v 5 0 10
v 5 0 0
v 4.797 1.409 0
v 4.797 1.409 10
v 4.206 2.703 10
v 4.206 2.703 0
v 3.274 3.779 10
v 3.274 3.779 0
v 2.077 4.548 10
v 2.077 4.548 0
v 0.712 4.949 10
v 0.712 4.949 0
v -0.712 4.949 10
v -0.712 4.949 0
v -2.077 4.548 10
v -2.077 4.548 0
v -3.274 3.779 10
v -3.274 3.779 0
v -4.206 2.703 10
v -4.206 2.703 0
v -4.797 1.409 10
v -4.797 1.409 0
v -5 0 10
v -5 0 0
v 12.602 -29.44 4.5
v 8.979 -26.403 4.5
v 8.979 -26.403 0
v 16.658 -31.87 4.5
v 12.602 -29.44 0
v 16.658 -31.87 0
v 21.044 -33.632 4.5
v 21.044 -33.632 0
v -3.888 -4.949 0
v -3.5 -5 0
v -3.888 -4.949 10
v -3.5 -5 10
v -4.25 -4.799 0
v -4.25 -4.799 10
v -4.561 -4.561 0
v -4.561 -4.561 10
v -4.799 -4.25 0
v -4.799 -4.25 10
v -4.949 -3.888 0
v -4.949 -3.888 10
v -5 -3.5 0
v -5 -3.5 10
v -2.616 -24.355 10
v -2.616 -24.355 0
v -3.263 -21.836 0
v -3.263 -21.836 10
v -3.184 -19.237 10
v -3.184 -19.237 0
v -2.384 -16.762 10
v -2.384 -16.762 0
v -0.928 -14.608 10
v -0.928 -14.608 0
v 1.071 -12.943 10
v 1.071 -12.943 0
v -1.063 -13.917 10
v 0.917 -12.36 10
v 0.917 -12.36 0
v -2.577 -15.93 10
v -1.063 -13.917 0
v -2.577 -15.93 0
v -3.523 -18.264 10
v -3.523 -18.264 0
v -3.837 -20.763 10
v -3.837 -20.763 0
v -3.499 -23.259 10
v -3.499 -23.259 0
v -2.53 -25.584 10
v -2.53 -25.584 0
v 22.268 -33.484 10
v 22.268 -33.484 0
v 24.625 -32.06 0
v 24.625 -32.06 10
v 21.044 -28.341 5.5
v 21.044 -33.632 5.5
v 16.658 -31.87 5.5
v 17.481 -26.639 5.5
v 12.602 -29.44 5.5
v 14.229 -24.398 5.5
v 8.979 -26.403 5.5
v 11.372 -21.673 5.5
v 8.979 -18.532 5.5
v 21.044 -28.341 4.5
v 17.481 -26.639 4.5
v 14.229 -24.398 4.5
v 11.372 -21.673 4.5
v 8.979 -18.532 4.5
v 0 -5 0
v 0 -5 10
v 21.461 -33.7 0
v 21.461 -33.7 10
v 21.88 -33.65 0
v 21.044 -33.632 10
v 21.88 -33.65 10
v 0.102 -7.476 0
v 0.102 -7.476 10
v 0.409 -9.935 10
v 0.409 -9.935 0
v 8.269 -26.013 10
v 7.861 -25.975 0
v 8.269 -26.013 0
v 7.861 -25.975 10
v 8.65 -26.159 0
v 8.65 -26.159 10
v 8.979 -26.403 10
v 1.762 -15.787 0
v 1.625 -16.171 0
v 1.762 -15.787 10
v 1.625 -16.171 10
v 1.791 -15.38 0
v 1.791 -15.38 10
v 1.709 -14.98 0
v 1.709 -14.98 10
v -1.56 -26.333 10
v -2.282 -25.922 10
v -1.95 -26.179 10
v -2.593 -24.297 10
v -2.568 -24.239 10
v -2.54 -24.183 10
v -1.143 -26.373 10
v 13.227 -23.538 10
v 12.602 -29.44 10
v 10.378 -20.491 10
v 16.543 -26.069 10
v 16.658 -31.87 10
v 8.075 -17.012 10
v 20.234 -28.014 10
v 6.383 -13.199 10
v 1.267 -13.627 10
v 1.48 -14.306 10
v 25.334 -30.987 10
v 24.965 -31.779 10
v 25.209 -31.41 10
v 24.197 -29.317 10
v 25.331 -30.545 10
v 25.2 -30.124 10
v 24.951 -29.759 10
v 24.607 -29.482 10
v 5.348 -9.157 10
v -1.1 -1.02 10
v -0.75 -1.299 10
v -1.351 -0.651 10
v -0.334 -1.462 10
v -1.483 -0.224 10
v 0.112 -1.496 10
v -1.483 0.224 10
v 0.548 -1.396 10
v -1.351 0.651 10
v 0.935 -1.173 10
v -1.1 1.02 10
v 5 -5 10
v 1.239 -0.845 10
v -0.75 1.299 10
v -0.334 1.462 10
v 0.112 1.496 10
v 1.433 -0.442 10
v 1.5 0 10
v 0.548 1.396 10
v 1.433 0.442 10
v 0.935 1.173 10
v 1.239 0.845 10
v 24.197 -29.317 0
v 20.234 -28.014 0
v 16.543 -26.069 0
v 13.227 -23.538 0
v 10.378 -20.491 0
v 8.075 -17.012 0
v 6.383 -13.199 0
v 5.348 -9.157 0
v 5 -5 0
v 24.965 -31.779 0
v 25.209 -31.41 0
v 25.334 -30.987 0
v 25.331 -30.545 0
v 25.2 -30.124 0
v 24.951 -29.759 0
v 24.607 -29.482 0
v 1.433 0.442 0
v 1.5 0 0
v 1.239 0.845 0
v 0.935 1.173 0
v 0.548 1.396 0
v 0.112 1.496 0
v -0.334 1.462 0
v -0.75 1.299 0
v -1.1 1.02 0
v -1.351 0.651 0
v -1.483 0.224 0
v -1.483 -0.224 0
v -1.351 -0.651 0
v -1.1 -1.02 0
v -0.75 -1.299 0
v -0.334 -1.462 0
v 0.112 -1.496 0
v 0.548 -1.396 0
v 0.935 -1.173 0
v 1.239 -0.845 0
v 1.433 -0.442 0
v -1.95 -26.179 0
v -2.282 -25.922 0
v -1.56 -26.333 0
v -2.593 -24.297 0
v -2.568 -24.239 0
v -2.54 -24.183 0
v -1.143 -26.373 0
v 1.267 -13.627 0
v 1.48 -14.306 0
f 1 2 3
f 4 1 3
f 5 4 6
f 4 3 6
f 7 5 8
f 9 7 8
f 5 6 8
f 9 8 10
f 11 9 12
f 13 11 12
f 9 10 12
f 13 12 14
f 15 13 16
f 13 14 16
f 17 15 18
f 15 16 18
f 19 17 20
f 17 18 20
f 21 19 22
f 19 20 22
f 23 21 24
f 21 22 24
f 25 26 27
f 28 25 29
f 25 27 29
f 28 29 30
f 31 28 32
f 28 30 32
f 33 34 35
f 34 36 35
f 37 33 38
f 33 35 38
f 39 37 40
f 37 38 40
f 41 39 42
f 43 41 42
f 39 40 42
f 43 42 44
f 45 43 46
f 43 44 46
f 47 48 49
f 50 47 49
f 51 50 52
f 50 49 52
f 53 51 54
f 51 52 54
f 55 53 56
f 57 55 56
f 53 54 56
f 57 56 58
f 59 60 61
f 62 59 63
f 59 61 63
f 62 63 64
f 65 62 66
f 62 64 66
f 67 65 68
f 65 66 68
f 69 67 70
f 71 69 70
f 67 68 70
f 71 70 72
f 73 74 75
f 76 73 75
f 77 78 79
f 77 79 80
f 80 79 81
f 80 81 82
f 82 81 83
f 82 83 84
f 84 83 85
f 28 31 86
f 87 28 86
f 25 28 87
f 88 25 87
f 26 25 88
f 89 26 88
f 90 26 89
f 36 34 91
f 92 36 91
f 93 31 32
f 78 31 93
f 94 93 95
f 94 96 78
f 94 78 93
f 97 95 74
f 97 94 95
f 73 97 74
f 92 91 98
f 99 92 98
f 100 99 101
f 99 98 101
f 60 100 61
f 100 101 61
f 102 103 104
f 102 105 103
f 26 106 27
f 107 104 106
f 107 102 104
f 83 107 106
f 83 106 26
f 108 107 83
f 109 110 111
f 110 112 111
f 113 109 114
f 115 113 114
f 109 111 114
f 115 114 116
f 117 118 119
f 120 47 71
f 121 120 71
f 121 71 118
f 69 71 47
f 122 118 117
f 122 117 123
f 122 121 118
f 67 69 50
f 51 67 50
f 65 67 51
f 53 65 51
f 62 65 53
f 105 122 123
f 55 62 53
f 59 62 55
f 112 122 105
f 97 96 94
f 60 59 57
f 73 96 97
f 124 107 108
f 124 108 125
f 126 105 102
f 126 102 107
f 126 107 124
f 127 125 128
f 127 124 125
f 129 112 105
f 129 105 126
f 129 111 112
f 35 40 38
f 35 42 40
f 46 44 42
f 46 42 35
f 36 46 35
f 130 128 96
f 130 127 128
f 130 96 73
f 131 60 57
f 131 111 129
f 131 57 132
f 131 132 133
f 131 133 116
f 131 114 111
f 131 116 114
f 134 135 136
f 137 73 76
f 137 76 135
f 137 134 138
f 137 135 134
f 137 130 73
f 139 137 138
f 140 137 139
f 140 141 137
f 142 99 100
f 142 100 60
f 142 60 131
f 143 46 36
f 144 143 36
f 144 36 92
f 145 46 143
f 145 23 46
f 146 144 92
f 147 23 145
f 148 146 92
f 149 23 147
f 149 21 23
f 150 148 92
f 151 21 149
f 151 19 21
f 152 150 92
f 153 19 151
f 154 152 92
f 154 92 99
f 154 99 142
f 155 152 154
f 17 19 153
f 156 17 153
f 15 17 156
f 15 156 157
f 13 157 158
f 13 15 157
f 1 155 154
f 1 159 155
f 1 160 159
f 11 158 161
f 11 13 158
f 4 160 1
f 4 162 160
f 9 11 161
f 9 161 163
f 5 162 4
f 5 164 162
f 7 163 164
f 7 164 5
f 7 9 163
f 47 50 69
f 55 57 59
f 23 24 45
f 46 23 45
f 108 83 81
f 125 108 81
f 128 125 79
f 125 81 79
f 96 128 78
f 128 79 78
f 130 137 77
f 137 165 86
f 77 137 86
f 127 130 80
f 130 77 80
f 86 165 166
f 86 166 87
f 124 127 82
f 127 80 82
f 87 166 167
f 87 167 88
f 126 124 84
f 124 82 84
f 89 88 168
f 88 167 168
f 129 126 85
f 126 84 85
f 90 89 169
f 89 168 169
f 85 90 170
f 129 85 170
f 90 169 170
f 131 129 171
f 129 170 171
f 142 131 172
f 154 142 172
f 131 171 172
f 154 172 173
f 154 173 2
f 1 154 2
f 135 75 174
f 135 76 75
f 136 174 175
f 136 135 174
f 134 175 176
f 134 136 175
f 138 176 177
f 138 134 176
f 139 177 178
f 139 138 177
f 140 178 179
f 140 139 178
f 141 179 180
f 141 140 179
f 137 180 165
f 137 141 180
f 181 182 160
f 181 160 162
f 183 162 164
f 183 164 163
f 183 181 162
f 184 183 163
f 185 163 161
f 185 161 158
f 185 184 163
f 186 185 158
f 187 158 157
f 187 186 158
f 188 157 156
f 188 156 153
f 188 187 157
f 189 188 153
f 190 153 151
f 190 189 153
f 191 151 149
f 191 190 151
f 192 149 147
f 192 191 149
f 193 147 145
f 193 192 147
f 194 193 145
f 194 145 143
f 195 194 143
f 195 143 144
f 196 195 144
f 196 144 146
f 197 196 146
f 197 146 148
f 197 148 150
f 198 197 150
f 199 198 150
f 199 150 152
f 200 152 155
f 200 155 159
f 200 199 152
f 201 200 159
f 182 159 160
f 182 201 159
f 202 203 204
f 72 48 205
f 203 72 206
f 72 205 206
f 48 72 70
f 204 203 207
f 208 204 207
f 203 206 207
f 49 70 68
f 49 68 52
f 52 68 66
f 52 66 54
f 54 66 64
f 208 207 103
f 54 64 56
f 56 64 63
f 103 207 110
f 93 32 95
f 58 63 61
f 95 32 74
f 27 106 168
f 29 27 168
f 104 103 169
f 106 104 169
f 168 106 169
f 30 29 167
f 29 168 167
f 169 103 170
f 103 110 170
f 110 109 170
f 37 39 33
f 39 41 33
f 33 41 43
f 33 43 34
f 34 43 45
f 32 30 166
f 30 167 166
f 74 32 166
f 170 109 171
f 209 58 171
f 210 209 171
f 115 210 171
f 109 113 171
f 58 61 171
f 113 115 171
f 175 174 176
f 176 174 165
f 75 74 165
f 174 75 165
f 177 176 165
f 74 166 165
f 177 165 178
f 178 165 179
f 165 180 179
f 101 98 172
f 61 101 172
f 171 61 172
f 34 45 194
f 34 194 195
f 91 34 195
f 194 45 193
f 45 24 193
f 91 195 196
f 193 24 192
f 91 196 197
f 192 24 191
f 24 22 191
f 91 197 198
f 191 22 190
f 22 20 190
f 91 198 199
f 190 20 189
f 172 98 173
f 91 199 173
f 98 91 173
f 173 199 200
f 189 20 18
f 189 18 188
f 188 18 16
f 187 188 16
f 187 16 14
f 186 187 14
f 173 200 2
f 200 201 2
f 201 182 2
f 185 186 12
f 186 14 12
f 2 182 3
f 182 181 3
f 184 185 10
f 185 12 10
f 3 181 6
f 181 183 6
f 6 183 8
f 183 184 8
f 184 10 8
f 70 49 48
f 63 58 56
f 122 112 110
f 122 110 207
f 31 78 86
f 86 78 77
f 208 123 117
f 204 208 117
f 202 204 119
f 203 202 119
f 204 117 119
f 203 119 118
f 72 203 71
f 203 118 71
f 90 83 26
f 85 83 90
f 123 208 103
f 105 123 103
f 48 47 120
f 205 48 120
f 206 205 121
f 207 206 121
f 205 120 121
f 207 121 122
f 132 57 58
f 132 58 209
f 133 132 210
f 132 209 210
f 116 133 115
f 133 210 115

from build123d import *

# Parameters (mm, degrees)
SKETCH_2_R              = 1.5
EXTRUDE_1_DEPTH         = 10
FILLET_1_R              = 1.5
CUT_EXTRUDE_START       = 8.978636738
CUT_EXTRUDE_6_OUTLINE_W = 18
CUT_EXTRUDE_6_OUTLINE_H = 1
CUT_EXTRUDE_6_DEPTH     = 12.065744551
EXTRUDE_START           = -10
EXTRUDE_2_DEPTH         = 10


# Read off the part's stored shape, not the designer's step: 切除-拉伸6
with BuildPart() as part:
    # 草图2 → 凸台-拉伸1 (new body)
    with BuildSketch(Plane.XY):
        with BuildLine():
            Line((-3.738313135, -26.487804482), (8.522639585, -25.945713856))
            ThreePointArc((8.522639585, -25.945713856), (14.597644225, -30.744268797), (21.698305683, -33.828489568))
            Line((21.698305683, -33.828489568), (28.148131868, -29.931317342))
            ThreePointArc((28.148131868, -29.931317342), (11.679291726, -22.010339454), (5, -5))
            Line((5, -5), (5, 0))
            ThreePointArc((5, 0), (0, 5), (-5, 0))
            Line((-5, 0), (-5, -5))
            Line((-5, -5), (1.011e-06, -5))
            ThreePointArc((1.011e-06, -5), (0.486326168, -10.379869542), (1.929534162, -15.585314685))
            Line((1.929534162, -15.585314685), (-3.738313135, -26.487804482))
        make_face()
        Circle(SKETCH_2_R, mode=Mode.SUBTRACT)
    extrude(amount=EXTRUDE_1_DEPTH)

    # 圆角1
    fillet_1_edges = [part.edges().sort_by_distance(p)[0] for p in [
        (-3.738313135, -26.487804482, 5),
        (1.929534162, -15.585314685, 5),
        (-5, -5, 5),
        (28.148131868, -29.931317342, 5),
        (21.698305683, -33.828489568, 5),
        (8.522639585, -25.945713856, 5),
    ]]
    fillet(fillet_1_edges, radius=FILLET_1_R)

    # 切除-拉伸6 outline → 切除-拉伸6 (cut)
    with BuildSketch(Plane.YZ.offset(CUT_EXTRUDE_START)):
        with Locations((-26, 5)):
            Rectangle(CUT_EXTRUDE_6_OUTLINE_W, CUT_EXTRUDE_6_OUTLINE_H)
    extrude(amount=CUT_EXTRUDE_6_DEPTH, mode=Mode.SUBTRACT)

    # 草图3 → 凸台-拉伸2 (add)
    with BuildSketch(Plane.XY.offset(10).offset(EXTRUDE_START)):
        with BuildLine():
            Line((-2.473670042, -25.681158433), (-1.937795126, -25.681158433))
            ThreePointArc((-1.937795126, -25.681158433), (-3.071581107, -18.689223974), (1.070755407, -12.943471949))
            ThreePointArc((1.070755407, -12.943471949), (0.992362696, -12.652249172), (0.916901566, -12.360253041))
            ThreePointArc((0.916901566, -12.360253041), (-3.537234076, -18.318495365), (-2.473670042, -25.681158433))
        make_face()
    extrude(amount=EXTRUDE_2_DEPTH)


solid = part.part
